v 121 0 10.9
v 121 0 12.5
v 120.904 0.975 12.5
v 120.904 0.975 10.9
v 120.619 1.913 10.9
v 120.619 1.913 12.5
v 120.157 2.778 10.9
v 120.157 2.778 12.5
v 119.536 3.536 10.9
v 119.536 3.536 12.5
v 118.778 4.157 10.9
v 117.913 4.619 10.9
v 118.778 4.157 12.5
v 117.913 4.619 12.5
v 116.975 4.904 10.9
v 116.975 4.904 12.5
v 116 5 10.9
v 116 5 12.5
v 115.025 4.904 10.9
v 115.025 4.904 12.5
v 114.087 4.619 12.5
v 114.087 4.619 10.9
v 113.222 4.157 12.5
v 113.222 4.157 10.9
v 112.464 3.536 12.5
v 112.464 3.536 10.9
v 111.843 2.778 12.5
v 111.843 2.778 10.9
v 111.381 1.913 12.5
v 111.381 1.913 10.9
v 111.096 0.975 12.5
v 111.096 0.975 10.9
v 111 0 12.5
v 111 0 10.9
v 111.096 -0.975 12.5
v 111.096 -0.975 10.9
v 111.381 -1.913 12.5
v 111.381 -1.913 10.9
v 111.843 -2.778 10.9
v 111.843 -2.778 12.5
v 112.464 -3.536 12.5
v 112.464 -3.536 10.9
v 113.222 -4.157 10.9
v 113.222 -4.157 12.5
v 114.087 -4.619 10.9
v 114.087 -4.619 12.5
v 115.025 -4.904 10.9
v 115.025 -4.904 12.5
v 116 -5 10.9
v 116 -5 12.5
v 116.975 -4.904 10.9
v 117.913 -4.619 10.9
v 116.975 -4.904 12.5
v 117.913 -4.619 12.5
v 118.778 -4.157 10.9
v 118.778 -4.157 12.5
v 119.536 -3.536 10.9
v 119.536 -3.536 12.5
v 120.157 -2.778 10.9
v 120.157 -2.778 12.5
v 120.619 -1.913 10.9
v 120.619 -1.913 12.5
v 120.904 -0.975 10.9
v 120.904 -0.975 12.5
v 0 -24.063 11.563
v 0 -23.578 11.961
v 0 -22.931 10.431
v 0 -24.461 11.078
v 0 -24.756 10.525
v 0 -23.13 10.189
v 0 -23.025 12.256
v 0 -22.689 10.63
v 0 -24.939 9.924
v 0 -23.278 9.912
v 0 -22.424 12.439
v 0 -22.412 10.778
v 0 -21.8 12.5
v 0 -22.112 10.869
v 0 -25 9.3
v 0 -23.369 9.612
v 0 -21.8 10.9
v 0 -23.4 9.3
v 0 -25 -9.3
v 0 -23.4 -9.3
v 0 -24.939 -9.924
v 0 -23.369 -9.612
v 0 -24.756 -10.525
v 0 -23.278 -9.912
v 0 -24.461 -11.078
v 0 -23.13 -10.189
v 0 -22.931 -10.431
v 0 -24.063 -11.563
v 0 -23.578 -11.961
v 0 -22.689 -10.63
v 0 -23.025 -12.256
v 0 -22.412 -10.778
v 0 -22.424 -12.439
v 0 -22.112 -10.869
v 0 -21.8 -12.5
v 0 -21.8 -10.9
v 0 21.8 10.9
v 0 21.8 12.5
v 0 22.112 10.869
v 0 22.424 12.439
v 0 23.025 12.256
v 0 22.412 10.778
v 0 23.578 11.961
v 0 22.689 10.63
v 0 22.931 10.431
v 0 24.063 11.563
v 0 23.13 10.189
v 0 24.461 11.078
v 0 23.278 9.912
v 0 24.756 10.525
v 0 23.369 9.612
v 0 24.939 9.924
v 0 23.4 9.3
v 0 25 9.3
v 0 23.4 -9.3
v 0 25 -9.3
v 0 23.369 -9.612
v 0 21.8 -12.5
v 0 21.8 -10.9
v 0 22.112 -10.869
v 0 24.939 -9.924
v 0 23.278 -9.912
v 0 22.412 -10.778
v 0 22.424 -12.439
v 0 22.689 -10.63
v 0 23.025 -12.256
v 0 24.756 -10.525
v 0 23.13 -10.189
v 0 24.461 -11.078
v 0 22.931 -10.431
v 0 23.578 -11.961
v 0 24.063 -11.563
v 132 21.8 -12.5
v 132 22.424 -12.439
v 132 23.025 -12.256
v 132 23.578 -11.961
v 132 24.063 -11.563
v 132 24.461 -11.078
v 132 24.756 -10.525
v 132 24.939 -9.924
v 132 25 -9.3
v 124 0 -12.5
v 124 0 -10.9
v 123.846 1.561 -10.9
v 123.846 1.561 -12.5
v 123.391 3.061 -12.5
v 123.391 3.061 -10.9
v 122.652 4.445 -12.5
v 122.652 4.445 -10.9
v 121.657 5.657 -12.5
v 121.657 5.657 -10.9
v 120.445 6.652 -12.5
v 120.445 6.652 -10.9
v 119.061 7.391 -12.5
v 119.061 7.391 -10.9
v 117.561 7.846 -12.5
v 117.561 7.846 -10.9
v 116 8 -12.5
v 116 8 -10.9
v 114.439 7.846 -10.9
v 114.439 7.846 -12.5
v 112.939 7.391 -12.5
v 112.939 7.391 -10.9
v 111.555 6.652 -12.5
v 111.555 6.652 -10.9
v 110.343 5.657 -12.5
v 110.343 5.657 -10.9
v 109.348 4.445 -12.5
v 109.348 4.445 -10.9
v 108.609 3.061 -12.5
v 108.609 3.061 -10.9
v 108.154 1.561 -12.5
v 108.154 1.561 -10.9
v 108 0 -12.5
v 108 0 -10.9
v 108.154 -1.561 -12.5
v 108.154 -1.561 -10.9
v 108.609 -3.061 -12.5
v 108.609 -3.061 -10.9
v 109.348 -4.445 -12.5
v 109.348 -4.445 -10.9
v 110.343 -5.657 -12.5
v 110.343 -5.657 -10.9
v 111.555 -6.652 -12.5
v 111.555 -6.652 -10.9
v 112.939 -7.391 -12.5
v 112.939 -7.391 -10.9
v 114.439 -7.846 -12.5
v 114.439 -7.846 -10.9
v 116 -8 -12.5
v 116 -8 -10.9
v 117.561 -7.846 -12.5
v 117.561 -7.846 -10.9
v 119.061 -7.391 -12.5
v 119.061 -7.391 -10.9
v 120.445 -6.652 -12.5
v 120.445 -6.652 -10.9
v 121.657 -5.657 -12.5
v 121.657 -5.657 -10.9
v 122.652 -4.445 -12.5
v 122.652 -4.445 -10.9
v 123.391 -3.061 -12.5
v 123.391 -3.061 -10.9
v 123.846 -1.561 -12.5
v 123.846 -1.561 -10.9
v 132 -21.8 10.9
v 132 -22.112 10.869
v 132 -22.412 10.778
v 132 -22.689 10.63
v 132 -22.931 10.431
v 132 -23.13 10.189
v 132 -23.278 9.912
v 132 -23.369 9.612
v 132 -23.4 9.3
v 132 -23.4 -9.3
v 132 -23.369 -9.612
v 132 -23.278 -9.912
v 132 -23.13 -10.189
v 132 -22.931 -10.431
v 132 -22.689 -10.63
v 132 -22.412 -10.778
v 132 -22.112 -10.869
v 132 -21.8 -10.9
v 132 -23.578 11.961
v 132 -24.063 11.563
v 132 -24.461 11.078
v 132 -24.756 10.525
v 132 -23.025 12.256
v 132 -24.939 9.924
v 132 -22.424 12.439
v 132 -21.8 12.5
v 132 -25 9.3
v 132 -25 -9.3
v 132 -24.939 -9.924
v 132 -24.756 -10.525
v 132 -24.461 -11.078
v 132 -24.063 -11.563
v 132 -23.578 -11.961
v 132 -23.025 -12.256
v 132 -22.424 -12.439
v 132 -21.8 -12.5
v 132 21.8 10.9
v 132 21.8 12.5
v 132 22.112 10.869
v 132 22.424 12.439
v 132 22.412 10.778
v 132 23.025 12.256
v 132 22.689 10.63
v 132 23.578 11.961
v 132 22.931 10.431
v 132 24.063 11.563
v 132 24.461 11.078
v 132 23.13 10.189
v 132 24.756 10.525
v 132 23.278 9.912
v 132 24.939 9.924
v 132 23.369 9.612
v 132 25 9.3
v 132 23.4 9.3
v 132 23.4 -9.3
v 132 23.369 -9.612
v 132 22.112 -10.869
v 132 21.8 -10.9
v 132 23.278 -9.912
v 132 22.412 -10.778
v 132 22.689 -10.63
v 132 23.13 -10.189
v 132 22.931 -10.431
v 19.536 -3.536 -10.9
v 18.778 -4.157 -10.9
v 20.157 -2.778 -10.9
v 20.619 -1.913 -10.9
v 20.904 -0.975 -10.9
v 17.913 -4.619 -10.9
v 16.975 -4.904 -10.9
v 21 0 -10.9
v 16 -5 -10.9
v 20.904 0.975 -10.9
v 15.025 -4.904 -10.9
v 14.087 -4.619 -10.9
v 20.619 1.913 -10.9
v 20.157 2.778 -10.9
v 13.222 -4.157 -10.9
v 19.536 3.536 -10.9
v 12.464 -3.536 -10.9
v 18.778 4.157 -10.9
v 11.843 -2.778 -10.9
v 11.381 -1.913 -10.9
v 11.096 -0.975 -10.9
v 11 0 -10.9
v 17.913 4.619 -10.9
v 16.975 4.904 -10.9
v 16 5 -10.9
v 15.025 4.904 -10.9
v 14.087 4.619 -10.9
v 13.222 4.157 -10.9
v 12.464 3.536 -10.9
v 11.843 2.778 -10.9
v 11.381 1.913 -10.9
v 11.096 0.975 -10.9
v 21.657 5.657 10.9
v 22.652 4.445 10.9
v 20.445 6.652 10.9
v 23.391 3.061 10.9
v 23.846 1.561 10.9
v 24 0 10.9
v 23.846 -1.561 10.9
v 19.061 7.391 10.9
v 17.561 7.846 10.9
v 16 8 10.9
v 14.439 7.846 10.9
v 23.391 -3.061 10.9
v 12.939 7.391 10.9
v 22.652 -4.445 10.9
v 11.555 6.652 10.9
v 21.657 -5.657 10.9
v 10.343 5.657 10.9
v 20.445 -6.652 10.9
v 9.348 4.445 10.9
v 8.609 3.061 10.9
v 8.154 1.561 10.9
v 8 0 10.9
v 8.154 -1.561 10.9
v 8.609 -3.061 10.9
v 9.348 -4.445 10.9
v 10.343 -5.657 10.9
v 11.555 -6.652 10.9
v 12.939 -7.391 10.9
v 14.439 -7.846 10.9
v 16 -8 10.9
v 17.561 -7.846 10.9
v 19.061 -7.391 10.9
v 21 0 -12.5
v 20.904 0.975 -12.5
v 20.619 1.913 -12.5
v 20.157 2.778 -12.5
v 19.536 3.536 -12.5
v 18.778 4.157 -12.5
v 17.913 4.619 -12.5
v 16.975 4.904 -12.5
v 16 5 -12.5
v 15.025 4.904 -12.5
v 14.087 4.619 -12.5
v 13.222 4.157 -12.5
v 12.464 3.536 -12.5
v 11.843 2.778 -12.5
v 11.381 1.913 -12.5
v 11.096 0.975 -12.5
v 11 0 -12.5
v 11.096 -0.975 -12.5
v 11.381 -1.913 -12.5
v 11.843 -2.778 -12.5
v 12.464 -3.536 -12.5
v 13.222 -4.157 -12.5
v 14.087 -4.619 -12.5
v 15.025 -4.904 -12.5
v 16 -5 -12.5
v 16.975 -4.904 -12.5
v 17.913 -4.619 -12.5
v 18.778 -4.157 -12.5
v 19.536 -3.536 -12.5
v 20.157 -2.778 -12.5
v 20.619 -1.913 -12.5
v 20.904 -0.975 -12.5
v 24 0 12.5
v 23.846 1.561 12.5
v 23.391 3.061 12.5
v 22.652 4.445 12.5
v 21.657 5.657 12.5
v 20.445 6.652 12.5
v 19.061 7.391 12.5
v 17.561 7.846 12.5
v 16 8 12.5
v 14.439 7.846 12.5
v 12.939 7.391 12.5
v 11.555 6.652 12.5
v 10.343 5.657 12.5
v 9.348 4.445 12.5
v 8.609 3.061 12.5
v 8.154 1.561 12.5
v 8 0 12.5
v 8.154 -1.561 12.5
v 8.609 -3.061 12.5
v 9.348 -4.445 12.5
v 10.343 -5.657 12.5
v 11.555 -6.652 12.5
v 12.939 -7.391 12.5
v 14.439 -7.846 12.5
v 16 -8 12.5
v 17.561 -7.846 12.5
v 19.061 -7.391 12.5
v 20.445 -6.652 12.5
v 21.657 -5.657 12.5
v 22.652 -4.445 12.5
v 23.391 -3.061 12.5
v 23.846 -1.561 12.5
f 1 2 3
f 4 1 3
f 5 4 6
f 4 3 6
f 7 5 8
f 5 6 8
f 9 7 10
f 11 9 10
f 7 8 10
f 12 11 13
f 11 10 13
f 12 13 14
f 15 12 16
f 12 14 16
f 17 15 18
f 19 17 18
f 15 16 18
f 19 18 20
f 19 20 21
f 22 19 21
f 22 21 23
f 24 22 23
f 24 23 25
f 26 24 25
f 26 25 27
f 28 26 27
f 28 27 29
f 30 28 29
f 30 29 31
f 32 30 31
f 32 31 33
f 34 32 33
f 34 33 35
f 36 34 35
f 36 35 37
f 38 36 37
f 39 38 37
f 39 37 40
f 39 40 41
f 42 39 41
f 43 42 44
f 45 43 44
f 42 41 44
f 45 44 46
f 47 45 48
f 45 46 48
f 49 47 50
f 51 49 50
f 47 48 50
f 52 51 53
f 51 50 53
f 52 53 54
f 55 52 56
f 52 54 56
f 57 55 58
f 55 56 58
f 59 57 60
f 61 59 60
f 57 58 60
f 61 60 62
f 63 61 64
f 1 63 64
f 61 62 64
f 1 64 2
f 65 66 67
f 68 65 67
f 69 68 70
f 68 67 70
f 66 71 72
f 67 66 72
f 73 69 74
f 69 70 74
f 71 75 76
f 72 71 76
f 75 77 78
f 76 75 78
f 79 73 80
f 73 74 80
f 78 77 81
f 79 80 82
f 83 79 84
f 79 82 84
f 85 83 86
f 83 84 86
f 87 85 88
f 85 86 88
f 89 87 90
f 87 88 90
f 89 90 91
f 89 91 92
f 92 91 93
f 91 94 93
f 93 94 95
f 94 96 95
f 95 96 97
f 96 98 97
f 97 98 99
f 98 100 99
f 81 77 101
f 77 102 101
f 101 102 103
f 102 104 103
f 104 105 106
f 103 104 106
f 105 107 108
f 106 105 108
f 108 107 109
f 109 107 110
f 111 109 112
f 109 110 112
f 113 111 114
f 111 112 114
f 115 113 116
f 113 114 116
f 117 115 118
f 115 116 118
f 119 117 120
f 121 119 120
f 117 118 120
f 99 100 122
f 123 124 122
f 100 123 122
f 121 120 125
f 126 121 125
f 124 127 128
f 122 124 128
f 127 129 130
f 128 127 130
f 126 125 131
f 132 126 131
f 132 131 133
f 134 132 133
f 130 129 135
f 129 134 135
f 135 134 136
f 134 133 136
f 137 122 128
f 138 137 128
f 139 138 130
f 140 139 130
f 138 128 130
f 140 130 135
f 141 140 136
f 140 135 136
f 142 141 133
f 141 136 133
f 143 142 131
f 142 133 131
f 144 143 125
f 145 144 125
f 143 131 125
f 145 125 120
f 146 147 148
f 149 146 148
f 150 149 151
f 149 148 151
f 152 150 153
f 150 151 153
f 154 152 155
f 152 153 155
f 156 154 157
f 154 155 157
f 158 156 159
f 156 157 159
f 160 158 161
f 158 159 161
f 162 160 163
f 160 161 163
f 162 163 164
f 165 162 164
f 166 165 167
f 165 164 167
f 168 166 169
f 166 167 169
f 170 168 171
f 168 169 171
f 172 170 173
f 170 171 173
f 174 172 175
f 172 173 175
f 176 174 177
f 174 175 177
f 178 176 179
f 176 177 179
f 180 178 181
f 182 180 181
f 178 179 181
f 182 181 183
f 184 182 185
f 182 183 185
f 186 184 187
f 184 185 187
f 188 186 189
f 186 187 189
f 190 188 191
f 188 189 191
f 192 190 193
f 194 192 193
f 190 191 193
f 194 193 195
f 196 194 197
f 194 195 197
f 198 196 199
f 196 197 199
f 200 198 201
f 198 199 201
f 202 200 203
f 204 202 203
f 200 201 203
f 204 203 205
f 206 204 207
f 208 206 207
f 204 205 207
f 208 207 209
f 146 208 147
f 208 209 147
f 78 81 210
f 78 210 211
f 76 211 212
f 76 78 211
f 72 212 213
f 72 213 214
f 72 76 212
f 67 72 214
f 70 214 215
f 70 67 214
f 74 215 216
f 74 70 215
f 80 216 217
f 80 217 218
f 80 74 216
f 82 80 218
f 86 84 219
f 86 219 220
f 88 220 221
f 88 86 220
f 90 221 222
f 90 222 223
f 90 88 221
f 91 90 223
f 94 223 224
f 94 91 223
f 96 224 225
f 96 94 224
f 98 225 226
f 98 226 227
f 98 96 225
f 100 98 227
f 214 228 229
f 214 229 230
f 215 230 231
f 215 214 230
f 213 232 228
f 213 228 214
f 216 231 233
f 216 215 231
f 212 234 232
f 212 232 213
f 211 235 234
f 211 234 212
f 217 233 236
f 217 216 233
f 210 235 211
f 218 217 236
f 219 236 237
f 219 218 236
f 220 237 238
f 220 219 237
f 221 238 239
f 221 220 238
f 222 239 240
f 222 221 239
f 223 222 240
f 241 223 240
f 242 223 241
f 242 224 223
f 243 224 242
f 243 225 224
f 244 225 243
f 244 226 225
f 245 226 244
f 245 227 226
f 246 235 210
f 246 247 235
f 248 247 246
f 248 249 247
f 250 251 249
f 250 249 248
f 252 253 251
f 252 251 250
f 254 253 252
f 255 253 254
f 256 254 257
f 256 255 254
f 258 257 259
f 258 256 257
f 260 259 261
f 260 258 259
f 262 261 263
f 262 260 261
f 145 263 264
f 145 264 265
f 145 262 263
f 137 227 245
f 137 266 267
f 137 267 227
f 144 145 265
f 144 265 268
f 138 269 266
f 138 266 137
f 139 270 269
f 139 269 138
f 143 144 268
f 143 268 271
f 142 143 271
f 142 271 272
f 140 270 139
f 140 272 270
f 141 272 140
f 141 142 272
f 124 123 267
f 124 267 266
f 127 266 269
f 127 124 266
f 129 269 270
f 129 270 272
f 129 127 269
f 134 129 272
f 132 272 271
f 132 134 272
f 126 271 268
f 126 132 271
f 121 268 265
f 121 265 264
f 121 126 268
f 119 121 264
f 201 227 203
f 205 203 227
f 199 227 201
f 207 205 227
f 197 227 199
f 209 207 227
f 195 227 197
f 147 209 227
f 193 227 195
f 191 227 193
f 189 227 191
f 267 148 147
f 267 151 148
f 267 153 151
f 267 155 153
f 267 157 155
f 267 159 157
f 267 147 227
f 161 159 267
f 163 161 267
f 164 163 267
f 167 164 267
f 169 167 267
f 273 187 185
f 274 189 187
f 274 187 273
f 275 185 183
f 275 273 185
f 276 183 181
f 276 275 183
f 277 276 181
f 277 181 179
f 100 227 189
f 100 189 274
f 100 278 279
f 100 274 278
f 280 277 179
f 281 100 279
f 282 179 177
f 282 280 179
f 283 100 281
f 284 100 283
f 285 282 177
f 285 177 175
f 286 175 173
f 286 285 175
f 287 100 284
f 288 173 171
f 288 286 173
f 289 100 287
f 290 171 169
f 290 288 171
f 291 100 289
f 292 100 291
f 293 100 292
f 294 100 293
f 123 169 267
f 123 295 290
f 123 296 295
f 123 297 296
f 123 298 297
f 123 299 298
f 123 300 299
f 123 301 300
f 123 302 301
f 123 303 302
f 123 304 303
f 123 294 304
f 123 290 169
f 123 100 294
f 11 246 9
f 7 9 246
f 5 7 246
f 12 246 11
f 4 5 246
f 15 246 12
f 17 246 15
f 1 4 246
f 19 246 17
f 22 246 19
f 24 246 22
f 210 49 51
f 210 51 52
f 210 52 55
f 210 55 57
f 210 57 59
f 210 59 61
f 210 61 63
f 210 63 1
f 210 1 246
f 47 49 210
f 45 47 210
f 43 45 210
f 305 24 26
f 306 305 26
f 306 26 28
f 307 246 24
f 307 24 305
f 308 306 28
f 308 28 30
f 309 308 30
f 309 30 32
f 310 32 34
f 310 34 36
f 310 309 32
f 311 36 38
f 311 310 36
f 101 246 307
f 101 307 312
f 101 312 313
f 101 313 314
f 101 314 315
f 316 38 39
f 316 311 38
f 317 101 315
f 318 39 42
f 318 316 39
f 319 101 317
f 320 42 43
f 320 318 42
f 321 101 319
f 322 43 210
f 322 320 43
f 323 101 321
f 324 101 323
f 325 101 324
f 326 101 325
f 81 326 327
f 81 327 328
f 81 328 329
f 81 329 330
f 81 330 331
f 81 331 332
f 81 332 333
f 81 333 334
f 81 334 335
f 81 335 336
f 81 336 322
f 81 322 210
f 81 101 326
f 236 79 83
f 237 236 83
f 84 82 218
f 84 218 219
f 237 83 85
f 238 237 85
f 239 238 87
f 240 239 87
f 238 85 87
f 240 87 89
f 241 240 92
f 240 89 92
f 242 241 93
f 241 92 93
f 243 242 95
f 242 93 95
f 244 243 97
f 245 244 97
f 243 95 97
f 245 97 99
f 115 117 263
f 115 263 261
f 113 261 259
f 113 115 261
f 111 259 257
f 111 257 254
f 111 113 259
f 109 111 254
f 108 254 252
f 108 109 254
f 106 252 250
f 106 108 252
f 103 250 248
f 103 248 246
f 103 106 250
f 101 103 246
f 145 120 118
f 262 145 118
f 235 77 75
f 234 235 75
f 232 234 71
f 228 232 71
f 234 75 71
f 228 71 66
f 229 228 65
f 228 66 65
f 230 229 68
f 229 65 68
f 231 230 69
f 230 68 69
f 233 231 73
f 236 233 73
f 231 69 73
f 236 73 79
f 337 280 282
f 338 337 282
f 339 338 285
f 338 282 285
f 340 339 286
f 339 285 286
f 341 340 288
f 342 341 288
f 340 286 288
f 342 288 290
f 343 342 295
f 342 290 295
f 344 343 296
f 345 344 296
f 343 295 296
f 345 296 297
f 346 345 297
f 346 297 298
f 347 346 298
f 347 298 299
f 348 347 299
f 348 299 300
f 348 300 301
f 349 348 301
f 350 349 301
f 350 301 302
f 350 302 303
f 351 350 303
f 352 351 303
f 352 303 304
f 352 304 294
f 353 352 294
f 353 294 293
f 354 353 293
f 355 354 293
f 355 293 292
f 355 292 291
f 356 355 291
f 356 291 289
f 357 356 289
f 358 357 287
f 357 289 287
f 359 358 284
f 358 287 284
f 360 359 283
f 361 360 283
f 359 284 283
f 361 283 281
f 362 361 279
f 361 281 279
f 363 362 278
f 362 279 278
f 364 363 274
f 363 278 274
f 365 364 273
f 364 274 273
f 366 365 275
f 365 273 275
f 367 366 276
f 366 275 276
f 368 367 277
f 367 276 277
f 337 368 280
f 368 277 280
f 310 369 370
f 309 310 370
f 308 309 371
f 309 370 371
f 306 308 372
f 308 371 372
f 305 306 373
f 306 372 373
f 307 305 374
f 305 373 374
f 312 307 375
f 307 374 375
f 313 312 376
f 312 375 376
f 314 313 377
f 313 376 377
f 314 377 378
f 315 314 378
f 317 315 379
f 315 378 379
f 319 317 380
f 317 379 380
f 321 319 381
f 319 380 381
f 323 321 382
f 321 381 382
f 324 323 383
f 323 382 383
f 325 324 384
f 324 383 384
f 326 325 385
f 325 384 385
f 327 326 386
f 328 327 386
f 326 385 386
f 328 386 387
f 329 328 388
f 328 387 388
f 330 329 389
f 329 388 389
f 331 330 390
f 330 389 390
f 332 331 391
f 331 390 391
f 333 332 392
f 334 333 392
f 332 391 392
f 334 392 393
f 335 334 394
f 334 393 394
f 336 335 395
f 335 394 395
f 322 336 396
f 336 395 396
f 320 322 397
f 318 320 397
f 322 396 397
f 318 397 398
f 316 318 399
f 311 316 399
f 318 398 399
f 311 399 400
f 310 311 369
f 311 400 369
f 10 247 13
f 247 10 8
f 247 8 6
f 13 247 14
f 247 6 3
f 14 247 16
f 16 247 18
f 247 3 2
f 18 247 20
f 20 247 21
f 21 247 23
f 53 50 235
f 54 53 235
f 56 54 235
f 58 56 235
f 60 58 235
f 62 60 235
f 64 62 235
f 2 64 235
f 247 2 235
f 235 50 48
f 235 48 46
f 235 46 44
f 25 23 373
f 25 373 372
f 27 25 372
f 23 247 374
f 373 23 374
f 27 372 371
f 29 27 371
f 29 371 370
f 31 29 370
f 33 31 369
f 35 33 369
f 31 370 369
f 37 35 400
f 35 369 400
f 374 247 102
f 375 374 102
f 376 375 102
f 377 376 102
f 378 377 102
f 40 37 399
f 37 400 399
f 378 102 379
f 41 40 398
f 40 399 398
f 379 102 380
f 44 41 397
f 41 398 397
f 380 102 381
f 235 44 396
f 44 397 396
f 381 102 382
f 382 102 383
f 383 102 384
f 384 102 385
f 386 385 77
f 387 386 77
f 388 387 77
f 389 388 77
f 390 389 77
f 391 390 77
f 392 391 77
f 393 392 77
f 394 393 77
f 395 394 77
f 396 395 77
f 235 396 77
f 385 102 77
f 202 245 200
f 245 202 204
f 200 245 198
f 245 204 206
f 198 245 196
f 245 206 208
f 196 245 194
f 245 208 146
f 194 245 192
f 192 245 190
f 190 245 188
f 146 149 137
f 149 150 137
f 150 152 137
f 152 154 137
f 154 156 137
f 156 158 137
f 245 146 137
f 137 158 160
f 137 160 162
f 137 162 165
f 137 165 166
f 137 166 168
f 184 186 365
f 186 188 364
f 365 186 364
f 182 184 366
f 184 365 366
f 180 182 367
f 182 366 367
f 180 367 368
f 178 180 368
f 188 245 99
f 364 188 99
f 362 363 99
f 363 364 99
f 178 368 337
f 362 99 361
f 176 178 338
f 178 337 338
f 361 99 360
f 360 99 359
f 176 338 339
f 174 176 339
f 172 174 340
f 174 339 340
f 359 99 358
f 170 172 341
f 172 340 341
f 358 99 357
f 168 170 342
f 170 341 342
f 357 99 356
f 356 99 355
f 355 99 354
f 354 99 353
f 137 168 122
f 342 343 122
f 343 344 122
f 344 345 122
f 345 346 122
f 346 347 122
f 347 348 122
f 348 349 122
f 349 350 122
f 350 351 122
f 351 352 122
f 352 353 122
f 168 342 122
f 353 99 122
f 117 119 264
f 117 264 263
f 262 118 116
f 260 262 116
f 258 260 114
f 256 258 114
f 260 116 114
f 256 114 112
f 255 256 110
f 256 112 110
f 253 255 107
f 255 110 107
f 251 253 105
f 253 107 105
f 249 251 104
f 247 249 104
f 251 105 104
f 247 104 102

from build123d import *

# Parameters (mm, degrees)
RECTANGULAR_TUBE_2_50_X_25_X_1_6_1_DEPTH = 132
SKETCH2_R                                = 5
CUT_EXTRUDE1_DEPTH                       = 137.65284483
SKETCH2_3_R                              = 8
SKETCH2_3_R_2                            = 5
CUT_EXTRUDE2_DEPTH                       = 1.6
CUT_EXTRUDE5_START                       = -23.4
SKETCH2_4_R                              = 8
SKETCH2_4_R_2                            = 5
CUT_EXTRUDE5_DEPTH                       = 1.6


with BuildPart() as part:
    # Sketch14 → Rectangular tube 2 50 X 25 X 1.6(1) (new body)
    with BuildSketch(Plane(origin=(0, 0, 0), x_dir=(0, 0, -1), z_dir=(1, 0, 0))):
        with BuildLine():
            Line((-9.3, -25), (9.3, -25))
            ThreePointArc((9.3, -25), (11.5627417, -24.0627417), (12.5, -21.8))
            Line((12.5, -21.8), (12.5, 21.8))
            ThreePointArc((12.5, 21.8), (11.5627417, 24.0627417), (9.3, 25))
            Line((9.3, 25), (-9.3, 25))
            ThreePointArc((-9.3, 25), (-11.5627417, 24.0627417), (-12.5, 21.8))
            Line((-12.5, 21.8), (-12.5, -21.8))
            ThreePointArc((-12.5, -21.8), (-11.5627417, -24.0627417), (-9.3, -25))
        make_face()
        with BuildLine():
            Line((-9.3, -23.4), (9.3, -23.4))
            ThreePointArc((9.3, -23.4), (10.43137085, -22.93137085), (10.9, -21.8))
            Line((10.9, -21.8), (10.9, 21.8))
            ThreePointArc((10.9, 21.8), (10.43137085, 22.93137085), (9.3, 23.4))
            Line((9.3, 23.4), (-9.3, 23.4))
            ThreePointArc((-9.3, 23.4), (-10.43137085, 22.93137085), (-10.9, 21.8))
            Line((-10.9, 21.8), (-10.9, -21.8))
            ThreePointArc((-10.9, -21.8), (-10.43137085, -22.93137085), (-9.3, -23.4))
        make_face(mode=Mode.SUBTRACT)
    extrude(amount=RECTANGULAR_TUBE_2_50_X_25_X_1_6_1_DEPTH)

    # Sketch2 → Cut-Extrude1 (cut, through all)
    with BuildSketch(Plane.XY.offset(12.5)):
        with Locations((16, 0)):
            Circle(SKETCH2_R)
        with Locations((116, 0)):
            Circle(SKETCH2_R)
    extrude(amount=-CUT_EXTRUDE1_DEPTH, mode=Mode.SUBTRACT)

    # Sketch2<3> → Cut-Extrude2 (cut)
    # profile 1 of 2: a face of its own
    with BuildSketch(Plane.XY.offset(12.5)):
        with Locations((16, 0)):
            Circle(SKETCH2_3_R)
        with Locations((16, 0)):
            Circle(SKETCH2_3_R_2, mode=Mode.SUBTRACT)
    # profile 2 of 2: a face of its own
    with BuildSketch(Plane.XY.offset(12.5)):
        with Locations((16, 0)):
            Circle(SKETCH2_3_R_2)
    extrude(amount=-CUT_EXTRUDE2_DEPTH, mode=Mode.SUBTRACT)

    # Sketch2<4> → Cut-Extrude5 (cut)
    # profile 1 of 2: a face of its own
    with BuildSketch(Plane.XY.offset(12.5).offset(CUT_EXTRUDE5_START)):
        with Locations((116, 0)):
            Circle(SKETCH2_4_R)
        with Locations((116, 0)):
            Circle(SKETCH2_4_R_2, mode=Mode.SUBTRACT)
    # profile 2 of 2: a face of its own
    with BuildSketch(Plane.XY.offset(12.5).offset(CUT_EXTRUDE5_START)):
        with Locations((116, 0)):
            Circle(SKETCH2_4_R_2)
    extrude(amount=-CUT_EXTRUDE5_DEPTH, mode=Mode.SUBTRACT)


solid = part.part
